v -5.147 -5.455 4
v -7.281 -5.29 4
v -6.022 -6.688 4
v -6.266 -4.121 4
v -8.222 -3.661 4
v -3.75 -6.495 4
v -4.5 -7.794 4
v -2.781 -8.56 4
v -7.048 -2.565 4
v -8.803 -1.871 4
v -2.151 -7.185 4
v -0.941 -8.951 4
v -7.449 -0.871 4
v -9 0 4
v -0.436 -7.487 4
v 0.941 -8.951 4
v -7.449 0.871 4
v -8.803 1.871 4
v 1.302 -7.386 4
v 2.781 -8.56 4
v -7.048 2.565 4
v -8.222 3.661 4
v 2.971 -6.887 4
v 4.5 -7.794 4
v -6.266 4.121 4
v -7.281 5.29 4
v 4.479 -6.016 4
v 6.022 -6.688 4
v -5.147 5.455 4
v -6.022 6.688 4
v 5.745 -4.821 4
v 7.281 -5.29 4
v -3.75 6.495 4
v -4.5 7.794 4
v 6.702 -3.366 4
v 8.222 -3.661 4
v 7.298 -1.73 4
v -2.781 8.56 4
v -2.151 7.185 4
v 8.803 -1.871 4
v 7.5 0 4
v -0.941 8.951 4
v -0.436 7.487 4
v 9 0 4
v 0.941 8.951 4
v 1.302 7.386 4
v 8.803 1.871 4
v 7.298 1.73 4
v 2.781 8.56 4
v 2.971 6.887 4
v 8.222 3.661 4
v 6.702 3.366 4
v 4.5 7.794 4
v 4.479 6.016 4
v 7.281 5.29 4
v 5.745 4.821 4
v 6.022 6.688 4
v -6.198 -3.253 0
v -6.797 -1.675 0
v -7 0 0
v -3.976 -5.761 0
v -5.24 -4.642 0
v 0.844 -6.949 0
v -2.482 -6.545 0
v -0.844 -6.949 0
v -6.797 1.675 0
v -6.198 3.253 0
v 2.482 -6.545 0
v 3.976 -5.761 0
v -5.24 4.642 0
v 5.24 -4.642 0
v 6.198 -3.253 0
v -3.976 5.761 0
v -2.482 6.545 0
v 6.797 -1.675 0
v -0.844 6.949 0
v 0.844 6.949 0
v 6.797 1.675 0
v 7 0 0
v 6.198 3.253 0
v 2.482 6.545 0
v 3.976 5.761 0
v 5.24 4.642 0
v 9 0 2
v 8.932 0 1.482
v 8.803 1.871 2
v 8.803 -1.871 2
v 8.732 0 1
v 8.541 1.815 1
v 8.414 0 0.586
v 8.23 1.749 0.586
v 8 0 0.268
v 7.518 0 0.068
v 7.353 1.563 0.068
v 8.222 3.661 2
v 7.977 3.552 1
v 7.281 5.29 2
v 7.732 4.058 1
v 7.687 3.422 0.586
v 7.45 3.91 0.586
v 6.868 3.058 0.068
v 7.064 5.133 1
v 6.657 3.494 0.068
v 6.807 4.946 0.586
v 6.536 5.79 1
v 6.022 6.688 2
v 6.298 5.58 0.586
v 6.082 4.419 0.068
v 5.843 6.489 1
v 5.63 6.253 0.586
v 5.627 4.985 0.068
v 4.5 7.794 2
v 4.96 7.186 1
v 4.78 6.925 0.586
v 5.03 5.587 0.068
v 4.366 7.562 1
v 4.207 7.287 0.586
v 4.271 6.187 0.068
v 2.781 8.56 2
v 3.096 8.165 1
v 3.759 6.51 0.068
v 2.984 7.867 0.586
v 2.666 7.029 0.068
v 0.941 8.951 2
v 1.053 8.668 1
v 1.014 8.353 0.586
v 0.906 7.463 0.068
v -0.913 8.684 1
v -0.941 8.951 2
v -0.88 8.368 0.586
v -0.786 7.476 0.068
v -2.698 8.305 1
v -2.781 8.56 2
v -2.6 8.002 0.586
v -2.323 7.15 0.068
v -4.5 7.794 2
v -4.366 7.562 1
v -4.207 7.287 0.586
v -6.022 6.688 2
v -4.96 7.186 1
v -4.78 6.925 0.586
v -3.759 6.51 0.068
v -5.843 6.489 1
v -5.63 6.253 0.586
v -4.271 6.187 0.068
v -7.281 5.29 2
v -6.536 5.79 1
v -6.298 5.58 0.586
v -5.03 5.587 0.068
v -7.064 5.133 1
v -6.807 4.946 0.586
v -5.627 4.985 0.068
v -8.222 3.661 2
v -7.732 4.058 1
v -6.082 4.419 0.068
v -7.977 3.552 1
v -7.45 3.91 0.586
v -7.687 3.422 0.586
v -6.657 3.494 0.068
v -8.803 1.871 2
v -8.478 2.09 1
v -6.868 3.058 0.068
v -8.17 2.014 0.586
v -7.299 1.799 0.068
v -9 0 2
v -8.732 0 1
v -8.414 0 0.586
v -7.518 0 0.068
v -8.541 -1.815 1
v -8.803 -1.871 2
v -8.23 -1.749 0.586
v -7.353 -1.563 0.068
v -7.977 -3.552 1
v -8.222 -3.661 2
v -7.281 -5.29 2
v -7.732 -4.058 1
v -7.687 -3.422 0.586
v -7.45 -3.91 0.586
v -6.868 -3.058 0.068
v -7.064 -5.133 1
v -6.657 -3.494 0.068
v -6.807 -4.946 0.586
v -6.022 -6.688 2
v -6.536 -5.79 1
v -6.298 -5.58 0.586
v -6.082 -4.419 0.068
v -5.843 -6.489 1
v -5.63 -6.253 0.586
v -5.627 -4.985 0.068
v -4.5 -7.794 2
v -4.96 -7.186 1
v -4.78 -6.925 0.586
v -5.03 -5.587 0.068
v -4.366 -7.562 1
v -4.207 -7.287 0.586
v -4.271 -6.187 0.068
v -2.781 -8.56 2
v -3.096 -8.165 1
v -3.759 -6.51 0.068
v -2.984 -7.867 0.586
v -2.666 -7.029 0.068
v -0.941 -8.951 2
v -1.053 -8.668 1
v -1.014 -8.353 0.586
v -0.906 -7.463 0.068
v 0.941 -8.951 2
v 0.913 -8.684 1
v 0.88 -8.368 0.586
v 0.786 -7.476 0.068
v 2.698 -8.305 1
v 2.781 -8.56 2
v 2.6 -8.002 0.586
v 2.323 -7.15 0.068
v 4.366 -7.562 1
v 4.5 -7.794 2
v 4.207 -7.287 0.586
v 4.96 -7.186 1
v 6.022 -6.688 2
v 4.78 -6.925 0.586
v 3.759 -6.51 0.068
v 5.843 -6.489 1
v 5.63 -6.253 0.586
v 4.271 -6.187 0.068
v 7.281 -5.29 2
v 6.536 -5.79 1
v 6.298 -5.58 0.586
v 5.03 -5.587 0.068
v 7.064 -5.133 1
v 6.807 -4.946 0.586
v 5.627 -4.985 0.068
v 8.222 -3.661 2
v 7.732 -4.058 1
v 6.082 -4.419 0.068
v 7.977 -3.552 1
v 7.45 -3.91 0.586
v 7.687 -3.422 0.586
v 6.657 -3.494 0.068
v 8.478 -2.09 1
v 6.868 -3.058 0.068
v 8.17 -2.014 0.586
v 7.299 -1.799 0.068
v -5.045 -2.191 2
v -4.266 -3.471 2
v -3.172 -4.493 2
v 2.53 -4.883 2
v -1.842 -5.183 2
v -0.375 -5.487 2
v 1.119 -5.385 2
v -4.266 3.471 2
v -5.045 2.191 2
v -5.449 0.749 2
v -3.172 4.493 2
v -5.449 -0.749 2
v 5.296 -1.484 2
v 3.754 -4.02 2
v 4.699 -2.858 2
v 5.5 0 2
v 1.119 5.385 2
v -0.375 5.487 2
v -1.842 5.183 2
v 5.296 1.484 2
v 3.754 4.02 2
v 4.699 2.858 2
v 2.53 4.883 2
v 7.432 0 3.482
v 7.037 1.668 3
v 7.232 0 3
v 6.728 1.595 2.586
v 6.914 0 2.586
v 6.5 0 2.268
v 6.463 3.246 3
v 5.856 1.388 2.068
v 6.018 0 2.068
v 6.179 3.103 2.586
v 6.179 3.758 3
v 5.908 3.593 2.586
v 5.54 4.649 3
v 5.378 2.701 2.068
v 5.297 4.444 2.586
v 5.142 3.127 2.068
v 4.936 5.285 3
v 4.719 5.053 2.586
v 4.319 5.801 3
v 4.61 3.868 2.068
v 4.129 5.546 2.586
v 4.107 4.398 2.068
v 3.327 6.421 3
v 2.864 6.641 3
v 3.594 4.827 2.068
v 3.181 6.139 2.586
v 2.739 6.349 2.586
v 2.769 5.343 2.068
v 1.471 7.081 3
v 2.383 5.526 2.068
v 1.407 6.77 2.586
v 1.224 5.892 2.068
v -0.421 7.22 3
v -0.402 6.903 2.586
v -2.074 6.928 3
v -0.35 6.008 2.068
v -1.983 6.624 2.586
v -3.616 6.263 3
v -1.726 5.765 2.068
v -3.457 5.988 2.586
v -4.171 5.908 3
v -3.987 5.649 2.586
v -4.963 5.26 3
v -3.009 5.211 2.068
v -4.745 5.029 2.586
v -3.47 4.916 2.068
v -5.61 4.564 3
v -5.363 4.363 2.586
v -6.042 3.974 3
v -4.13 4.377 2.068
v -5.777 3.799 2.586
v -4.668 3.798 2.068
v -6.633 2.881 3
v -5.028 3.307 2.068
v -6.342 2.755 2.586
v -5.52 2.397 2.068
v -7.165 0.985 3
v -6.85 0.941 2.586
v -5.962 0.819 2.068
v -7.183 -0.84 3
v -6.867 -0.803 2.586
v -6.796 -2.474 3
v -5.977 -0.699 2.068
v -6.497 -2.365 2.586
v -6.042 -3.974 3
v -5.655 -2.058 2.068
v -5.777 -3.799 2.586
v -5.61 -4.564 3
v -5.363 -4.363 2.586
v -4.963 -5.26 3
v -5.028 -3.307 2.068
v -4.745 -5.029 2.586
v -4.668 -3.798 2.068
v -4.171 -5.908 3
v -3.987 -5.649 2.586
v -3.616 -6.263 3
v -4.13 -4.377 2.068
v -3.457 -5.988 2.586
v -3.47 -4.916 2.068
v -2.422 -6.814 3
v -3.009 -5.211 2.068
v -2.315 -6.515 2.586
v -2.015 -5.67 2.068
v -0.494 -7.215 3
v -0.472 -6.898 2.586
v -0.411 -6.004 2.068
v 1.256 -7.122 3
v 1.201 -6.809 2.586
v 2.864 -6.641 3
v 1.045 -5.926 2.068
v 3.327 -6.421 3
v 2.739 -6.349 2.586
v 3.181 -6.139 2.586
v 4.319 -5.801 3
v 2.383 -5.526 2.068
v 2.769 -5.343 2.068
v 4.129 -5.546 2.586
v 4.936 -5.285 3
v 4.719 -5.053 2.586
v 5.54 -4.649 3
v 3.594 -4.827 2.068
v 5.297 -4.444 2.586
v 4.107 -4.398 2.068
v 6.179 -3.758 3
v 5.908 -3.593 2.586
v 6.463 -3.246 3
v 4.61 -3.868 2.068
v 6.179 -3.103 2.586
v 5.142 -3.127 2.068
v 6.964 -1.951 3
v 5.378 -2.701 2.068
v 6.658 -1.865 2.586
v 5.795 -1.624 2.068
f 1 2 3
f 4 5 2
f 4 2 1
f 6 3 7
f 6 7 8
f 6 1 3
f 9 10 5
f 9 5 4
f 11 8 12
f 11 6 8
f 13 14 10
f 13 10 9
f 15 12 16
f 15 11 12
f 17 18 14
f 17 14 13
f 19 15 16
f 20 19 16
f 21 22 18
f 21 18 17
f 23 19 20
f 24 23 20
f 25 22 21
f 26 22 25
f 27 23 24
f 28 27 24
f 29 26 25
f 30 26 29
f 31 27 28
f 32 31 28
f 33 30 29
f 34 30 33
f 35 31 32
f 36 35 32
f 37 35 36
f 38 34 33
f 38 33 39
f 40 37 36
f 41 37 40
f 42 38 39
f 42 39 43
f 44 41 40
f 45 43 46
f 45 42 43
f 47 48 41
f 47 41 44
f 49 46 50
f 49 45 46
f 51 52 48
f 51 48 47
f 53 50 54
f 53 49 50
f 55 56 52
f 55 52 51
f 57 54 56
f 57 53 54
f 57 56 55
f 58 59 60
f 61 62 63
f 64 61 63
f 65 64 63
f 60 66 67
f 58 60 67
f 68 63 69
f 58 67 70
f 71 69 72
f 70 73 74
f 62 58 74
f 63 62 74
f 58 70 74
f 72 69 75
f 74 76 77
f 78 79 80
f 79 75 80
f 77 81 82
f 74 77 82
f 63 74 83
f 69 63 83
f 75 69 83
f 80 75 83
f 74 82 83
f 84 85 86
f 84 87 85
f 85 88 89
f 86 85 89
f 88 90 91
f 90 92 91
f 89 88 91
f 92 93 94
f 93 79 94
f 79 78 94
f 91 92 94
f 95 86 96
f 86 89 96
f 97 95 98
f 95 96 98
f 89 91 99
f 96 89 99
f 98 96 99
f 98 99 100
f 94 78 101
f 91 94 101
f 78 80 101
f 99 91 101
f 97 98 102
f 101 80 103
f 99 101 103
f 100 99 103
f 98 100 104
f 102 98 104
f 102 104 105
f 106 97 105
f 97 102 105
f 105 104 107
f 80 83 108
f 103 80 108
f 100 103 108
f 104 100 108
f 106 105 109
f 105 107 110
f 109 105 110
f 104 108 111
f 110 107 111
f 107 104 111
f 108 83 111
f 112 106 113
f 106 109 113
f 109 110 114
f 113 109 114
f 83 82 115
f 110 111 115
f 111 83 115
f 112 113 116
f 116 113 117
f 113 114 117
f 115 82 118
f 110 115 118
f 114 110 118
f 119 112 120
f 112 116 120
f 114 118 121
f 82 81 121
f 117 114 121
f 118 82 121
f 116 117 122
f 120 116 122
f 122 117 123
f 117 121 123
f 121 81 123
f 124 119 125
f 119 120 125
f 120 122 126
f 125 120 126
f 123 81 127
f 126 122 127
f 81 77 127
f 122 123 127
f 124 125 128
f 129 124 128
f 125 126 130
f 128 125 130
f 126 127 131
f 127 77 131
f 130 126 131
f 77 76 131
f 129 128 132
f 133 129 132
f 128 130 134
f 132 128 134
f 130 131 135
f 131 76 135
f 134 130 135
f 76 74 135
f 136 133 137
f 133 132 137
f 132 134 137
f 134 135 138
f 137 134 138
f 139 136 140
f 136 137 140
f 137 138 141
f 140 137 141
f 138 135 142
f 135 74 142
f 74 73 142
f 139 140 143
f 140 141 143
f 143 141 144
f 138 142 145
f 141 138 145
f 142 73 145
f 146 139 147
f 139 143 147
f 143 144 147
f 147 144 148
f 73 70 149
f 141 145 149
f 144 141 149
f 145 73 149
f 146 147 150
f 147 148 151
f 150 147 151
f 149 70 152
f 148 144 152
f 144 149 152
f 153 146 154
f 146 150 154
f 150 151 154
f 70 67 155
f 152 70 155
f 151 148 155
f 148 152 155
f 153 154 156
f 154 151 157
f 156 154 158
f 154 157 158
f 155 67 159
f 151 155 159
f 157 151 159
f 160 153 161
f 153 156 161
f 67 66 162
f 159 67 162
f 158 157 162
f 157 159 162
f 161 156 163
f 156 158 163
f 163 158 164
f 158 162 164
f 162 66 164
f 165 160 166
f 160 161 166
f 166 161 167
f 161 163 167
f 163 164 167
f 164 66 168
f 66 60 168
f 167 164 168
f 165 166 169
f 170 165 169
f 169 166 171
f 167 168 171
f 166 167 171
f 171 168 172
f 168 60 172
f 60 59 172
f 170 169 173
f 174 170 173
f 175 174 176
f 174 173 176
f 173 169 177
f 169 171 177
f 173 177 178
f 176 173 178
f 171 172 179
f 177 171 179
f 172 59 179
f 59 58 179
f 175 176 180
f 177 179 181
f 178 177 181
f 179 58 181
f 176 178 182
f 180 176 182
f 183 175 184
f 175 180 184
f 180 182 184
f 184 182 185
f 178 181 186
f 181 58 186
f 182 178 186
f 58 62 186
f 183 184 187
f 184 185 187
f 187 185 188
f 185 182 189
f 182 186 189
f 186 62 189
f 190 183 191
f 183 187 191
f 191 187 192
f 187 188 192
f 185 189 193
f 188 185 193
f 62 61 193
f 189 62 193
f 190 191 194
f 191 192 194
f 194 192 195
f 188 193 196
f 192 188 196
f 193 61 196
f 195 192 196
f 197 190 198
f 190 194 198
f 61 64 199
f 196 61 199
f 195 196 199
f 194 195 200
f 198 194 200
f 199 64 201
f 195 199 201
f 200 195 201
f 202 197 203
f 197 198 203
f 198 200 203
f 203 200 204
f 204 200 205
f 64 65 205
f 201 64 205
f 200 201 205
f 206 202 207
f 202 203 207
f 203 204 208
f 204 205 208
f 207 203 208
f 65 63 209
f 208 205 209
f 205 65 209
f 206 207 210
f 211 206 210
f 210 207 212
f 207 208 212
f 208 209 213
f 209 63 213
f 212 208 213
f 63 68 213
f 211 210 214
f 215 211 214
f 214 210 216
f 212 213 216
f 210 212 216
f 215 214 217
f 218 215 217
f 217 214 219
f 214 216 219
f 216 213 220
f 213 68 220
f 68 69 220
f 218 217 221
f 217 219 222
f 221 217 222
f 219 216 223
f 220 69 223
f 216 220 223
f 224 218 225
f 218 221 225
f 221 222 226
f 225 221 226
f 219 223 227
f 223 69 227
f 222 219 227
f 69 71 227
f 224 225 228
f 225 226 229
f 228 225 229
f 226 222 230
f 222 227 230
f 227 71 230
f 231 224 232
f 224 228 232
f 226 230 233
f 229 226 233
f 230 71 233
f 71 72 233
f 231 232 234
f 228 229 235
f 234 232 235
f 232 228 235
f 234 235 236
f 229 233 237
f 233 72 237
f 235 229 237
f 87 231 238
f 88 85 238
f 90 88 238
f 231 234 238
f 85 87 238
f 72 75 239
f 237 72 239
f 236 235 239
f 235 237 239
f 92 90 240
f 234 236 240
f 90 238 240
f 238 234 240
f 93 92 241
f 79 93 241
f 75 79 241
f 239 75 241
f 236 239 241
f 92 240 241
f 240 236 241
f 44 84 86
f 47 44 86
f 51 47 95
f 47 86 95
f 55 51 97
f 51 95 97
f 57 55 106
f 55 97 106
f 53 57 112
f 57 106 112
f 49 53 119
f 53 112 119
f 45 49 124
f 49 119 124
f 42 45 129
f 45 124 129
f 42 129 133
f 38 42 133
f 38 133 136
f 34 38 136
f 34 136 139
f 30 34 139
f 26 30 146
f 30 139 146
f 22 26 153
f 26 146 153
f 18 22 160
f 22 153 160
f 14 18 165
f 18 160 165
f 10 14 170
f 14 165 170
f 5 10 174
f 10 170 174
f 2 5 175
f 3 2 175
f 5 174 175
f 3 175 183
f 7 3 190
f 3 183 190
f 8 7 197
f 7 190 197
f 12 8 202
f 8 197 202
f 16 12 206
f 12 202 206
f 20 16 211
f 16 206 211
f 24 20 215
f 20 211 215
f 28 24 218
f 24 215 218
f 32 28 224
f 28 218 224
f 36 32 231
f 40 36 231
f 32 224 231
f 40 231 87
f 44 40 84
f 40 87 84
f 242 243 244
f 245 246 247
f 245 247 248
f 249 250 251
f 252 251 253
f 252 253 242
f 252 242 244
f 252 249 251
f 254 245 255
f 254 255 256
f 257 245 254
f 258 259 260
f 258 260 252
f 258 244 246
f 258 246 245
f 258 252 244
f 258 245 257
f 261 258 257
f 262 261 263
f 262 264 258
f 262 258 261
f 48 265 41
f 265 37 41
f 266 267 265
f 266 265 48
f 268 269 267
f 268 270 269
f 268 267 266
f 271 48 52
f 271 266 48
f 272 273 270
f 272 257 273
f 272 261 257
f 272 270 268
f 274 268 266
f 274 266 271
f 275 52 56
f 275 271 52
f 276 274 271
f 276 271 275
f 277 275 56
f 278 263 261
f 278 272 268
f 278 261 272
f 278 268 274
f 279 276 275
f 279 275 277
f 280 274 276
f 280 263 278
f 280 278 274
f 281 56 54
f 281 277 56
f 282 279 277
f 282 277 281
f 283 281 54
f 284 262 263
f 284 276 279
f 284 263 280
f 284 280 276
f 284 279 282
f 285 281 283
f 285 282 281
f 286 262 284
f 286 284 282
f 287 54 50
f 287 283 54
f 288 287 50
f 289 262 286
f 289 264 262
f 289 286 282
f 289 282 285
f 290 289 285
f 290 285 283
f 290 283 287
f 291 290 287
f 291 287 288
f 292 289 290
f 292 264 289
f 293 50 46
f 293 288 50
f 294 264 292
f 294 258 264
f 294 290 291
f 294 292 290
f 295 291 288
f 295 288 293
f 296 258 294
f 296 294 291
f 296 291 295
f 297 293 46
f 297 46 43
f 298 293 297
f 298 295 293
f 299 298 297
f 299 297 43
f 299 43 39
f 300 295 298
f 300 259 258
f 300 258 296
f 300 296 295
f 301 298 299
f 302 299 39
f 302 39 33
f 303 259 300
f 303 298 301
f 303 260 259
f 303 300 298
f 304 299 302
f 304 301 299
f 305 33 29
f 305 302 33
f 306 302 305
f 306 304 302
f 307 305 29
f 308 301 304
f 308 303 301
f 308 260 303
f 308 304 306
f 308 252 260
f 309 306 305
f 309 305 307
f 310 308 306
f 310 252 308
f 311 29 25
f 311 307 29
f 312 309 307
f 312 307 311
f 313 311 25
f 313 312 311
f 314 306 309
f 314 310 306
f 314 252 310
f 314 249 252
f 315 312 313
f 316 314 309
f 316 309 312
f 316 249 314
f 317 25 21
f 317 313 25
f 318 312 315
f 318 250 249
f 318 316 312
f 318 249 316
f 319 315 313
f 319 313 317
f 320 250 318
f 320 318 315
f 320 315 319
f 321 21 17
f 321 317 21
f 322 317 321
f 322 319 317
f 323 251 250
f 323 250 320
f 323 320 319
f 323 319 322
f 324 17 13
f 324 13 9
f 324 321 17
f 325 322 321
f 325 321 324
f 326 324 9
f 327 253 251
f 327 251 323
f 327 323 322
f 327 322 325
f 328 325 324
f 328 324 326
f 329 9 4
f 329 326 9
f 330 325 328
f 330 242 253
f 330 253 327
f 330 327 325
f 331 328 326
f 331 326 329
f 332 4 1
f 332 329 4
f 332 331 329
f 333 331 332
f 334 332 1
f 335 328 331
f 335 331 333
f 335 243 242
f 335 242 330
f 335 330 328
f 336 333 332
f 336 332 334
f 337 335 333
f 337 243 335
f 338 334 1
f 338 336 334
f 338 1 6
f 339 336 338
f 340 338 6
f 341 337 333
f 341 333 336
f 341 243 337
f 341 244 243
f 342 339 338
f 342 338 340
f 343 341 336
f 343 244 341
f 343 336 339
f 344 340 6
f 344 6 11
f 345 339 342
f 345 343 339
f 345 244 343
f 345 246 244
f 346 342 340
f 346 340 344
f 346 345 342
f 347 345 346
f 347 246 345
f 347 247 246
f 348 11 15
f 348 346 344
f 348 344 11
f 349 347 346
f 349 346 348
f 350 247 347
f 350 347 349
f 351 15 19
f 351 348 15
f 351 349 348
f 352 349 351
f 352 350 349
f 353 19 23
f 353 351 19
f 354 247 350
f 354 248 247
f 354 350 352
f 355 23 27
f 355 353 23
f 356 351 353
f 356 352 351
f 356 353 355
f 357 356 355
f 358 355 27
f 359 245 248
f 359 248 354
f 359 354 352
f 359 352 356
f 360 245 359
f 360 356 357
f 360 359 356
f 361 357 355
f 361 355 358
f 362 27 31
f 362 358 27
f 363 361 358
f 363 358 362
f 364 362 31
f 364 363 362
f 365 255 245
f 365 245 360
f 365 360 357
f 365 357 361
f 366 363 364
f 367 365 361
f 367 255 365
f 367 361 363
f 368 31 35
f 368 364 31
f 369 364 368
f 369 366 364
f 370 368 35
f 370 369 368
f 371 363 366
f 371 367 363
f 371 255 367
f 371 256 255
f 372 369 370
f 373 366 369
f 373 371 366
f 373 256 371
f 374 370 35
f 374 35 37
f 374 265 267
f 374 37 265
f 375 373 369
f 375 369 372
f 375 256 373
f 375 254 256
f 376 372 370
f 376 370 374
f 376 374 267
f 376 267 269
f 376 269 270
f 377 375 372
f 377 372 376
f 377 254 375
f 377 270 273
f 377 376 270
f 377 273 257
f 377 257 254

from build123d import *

# Parameters (mm, degrees)
SKETCH1_R           = 9
BOSS_EXTRUDE1_DEPTH = 4
SKETCH2_R           = 7.5
CUT_EXTRUDE1_DEPTH  = 2
FILLET1_R           = 2
FILLET2_R           = 2


with BuildPart() as part:
    # Sketch1 → Boss-Extrude1 (new body)
    with BuildSketch(Plane.XY):
        Circle(SKETCH1_R)
    extrude(amount=BOSS_EXTRUDE1_DEPTH)

    # Sketch2 → Cut-Extrude1 (cut)
    with BuildSketch(Plane.XY.offset(4)):
        Circle(SKETCH2_R)
    extrude(amount=-CUT_EXTRUDE1_DEPTH, mode=Mode.SUBTRACT)

    # Fillet1
    fillet1_edges = [part.edges().sort_by_distance(p)[0] for p in [
        (-9, 0, 0),
    ]]
    fillet(fillet1_edges, radius=FILLET1_R)

    # Fillet2
    fillet2_edges = [part.edges().sort_by_distance(p)[0] for p in [
        (-7.5, 0, 2),
    ]]
    fillet(fillet2_edges, radius=FILLET2_R - 0.0001)  # a hair under: the kernel refuses the full size


solid = part.part
